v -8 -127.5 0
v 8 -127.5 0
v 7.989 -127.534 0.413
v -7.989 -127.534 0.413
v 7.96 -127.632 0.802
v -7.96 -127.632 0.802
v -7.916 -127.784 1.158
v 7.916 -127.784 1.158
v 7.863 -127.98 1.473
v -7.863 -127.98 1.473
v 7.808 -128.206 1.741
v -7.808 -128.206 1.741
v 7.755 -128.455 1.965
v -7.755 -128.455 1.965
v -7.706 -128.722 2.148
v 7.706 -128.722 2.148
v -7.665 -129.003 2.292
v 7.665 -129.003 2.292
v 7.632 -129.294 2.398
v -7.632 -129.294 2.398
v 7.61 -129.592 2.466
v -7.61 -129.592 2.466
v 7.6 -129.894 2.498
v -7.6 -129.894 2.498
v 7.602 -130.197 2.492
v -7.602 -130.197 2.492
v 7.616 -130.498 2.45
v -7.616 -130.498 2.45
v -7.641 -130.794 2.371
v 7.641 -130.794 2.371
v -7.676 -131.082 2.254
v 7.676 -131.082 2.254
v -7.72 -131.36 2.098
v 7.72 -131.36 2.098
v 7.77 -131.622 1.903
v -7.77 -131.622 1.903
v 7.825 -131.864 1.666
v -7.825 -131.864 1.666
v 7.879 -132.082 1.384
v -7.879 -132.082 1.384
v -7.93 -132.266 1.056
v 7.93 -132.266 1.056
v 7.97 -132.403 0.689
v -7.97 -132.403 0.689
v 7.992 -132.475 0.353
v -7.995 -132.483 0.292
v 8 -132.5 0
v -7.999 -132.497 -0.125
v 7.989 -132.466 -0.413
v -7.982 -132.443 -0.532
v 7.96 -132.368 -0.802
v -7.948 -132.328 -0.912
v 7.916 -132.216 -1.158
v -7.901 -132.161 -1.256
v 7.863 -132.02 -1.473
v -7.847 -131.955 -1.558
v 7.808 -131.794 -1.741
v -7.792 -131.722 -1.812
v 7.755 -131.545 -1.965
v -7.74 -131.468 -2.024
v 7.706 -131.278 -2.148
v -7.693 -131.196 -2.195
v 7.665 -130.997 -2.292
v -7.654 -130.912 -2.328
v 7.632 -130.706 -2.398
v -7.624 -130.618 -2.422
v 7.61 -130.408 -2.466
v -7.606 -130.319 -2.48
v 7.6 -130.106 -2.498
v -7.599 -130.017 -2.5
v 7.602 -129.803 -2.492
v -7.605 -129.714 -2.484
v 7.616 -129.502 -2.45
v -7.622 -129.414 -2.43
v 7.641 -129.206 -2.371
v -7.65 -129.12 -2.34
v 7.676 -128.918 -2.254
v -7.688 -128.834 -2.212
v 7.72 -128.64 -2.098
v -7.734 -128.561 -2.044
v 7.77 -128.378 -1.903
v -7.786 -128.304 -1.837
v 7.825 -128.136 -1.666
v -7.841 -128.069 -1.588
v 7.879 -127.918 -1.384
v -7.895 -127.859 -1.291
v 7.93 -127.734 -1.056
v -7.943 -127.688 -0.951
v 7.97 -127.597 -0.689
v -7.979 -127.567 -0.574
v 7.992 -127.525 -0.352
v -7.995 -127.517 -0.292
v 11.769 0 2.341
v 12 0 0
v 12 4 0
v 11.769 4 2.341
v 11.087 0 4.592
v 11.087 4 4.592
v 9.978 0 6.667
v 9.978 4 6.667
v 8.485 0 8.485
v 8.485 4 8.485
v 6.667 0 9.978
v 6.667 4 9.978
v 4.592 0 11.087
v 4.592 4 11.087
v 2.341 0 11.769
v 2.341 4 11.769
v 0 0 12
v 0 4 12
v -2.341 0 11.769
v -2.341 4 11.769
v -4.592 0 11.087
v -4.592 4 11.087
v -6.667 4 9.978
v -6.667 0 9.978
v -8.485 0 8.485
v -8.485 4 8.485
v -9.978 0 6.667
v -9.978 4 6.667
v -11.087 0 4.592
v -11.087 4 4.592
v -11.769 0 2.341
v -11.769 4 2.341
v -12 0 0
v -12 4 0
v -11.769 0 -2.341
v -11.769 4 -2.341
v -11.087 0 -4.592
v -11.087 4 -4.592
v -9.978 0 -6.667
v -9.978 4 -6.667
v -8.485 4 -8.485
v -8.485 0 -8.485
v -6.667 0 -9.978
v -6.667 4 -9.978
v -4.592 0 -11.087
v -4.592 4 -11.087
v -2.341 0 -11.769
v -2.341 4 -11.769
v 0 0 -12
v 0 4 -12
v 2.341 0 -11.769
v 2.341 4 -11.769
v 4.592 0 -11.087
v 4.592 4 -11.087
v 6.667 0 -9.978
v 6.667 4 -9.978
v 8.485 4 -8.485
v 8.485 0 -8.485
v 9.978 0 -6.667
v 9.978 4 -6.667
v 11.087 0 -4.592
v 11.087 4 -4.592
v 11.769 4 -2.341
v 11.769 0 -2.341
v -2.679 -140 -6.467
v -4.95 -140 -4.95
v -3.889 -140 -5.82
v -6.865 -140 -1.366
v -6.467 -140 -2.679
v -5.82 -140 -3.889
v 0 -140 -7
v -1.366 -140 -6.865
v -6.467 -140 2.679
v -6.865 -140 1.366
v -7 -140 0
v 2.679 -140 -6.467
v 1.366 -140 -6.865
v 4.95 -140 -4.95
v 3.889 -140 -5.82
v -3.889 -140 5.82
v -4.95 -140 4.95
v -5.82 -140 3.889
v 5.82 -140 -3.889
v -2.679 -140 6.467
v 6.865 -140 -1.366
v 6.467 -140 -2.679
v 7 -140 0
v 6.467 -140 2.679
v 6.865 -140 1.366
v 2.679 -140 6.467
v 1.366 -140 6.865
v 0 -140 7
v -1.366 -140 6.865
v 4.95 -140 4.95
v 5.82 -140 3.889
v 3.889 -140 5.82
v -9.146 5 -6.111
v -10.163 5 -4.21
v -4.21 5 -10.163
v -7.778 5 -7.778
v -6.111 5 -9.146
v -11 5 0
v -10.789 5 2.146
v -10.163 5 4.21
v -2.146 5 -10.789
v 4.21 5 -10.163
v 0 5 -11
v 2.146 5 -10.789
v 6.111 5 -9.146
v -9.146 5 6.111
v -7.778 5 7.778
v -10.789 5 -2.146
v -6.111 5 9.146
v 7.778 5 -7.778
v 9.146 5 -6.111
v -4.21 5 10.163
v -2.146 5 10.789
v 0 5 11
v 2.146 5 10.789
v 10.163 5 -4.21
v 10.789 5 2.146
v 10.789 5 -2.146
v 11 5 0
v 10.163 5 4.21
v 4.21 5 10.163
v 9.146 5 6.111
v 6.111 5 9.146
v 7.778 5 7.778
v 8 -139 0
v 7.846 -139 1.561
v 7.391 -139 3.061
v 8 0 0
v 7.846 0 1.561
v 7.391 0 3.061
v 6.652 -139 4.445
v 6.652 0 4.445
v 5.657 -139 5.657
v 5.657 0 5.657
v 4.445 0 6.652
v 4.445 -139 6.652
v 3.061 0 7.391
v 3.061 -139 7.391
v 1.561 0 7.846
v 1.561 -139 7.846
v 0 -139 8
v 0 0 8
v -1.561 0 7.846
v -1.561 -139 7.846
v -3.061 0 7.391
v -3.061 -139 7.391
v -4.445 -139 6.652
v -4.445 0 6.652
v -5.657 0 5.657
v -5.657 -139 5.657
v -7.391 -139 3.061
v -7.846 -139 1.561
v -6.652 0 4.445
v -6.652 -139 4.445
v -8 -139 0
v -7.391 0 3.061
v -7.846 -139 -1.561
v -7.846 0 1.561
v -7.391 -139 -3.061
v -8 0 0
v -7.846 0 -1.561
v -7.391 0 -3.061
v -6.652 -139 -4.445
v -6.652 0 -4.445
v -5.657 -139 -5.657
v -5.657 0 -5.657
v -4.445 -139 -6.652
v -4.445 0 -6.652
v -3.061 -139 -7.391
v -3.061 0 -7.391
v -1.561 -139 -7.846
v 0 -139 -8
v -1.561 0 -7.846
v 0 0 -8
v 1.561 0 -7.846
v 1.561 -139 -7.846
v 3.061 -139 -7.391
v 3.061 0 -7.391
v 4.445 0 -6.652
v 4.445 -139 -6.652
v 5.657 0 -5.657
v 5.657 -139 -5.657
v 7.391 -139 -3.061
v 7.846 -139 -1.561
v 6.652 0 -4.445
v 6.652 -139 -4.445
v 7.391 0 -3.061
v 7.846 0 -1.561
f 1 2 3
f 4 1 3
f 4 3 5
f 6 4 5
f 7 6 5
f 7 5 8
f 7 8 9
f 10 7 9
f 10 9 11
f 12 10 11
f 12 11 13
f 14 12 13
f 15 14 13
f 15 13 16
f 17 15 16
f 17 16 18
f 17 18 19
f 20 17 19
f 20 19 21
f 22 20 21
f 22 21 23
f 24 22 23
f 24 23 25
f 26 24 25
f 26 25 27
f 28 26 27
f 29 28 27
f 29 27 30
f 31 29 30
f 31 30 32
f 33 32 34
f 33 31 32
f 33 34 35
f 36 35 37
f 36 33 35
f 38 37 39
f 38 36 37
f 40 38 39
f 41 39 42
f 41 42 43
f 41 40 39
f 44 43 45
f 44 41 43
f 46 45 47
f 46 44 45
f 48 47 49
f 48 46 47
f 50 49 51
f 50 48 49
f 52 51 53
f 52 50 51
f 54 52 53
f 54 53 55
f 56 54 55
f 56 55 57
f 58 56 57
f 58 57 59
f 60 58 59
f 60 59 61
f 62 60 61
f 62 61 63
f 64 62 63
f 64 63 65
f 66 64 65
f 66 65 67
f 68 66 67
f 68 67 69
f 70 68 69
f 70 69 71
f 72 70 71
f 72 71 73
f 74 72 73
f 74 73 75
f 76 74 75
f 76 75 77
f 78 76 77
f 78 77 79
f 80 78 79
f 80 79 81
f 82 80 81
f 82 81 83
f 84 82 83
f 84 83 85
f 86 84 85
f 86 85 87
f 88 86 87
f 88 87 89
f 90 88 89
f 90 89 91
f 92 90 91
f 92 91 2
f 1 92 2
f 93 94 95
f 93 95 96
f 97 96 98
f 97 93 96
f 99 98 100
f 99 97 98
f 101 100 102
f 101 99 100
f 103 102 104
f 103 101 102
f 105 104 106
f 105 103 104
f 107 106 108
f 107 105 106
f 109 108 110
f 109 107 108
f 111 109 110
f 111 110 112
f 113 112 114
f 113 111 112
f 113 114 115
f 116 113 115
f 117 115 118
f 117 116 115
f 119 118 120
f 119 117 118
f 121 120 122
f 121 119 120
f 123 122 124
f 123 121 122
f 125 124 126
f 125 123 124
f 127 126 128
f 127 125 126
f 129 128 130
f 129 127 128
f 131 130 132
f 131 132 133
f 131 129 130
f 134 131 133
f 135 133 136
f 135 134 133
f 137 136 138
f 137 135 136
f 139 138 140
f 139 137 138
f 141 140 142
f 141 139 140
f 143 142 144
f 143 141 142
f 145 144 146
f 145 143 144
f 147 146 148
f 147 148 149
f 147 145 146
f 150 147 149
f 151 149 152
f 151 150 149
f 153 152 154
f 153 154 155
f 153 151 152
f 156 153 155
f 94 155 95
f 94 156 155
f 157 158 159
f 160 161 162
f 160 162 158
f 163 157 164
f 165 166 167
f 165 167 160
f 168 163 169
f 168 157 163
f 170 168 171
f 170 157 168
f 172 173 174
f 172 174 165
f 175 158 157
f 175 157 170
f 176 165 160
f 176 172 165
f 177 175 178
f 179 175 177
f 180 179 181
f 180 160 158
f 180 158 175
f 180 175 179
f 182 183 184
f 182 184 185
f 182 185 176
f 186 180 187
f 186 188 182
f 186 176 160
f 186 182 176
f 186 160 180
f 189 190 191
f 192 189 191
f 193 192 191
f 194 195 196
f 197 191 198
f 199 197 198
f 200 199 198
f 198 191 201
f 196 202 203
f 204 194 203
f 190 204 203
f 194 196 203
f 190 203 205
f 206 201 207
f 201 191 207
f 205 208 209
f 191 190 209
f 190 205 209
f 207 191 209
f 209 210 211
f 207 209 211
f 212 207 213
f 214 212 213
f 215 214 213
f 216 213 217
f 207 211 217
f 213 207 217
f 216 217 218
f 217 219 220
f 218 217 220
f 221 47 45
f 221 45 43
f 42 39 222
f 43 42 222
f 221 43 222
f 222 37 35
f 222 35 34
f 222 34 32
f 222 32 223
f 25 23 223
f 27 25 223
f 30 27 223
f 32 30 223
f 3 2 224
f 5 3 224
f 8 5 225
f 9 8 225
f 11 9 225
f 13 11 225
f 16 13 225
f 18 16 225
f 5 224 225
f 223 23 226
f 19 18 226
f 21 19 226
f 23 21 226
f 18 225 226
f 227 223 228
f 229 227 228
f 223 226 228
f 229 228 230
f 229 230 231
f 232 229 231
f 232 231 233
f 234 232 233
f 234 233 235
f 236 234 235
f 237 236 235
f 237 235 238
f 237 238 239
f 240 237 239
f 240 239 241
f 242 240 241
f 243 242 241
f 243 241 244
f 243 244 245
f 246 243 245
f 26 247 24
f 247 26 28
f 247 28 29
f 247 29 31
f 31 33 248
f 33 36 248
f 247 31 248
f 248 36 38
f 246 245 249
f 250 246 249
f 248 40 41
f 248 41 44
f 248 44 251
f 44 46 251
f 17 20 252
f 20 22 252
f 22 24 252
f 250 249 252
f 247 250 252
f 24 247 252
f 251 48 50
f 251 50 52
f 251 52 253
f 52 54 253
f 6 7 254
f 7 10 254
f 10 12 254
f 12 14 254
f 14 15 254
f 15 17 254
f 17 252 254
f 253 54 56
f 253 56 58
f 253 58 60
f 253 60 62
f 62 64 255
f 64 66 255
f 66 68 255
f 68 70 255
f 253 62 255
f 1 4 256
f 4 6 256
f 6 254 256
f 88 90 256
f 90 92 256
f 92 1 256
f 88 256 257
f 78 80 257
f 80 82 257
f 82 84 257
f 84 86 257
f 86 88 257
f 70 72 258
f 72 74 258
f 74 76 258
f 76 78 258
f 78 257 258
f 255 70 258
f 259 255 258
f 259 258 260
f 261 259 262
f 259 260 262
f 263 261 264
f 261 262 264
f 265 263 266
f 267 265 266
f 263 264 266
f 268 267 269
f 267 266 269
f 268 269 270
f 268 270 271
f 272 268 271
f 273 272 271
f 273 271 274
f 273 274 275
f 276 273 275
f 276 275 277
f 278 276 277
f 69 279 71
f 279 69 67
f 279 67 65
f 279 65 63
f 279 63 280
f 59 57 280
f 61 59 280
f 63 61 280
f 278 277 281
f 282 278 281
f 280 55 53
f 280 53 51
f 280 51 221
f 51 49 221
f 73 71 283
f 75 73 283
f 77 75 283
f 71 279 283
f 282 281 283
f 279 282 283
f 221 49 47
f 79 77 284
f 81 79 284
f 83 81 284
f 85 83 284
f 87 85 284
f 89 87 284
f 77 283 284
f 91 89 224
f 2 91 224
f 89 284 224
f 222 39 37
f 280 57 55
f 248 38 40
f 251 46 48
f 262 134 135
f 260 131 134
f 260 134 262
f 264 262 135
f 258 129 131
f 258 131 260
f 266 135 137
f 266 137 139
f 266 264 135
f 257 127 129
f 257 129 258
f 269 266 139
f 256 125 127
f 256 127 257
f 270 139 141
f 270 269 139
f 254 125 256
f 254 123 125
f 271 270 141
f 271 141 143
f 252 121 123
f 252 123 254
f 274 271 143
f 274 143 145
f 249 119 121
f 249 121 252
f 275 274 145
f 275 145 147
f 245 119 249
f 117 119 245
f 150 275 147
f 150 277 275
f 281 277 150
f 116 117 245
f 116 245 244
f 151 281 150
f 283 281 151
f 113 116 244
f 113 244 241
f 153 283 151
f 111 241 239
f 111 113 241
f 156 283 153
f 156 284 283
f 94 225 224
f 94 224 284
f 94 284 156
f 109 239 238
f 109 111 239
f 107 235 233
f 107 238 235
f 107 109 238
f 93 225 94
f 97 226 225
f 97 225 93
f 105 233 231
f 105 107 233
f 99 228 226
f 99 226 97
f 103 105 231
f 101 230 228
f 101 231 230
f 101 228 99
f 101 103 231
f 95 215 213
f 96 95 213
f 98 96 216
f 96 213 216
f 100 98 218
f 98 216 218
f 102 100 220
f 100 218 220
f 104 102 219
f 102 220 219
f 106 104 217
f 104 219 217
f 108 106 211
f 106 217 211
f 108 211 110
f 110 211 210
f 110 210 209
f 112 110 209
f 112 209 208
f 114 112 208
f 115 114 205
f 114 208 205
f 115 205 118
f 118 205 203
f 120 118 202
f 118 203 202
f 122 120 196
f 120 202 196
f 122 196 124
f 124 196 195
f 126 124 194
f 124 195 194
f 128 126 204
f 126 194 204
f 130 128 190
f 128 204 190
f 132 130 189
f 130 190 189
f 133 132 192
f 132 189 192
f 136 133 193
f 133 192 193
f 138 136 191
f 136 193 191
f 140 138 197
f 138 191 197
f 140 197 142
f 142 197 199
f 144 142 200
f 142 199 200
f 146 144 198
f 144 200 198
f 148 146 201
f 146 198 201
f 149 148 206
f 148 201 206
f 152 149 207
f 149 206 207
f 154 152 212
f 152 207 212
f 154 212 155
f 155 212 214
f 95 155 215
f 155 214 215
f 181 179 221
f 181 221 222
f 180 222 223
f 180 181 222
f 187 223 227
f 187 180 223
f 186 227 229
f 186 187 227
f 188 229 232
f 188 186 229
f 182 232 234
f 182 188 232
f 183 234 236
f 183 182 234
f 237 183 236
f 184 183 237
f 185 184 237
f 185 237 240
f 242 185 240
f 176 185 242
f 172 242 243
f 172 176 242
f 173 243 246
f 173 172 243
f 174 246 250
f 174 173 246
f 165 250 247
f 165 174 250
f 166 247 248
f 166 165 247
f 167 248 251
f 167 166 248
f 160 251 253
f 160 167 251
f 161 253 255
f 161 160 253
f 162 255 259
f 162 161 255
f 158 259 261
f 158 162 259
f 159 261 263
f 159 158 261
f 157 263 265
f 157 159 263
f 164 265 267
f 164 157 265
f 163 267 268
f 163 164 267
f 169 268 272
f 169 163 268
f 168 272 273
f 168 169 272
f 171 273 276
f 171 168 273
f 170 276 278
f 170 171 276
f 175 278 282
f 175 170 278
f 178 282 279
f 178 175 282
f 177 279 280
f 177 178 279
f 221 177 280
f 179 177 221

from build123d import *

# Parameters (mm, degrees)
F0_R     = 8
F1_DEPTH = 140
F0_R_2   = 12
F2_DEPTH = 5
F3_SIZE  = 1
F5_R     = 2.5
F6_DEPTH = 20.001


with BuildPart() as f1:
    # F0 (on Front) → F1 (new body)
    with BuildSketch(Plane.XZ):
        Circle(F0_R)
    extrude(amount=F1_DEPTH)

    # F0 (on Front) → F2 (join)
    with BuildSketch(Plane.XZ):
        Circle(F0_R_2)
        Circle(F0_R, mode=Mode.SUBTRACT)
        Circle(F0_R)
    extrude(amount=-F2_DEPTH)

    # F3
    f3_edges = [f1.edges().sort_by_distance(p)[0] for p in [
        (-12, 5, 0),
        (-8, -140, 0),
    ]]
    chamfer(f3_edges, length=F3_SIZE)

    # F5 (on offset) → F6 (cut, through all)
    with BuildSketch(Plane.YZ.offset(-8)):
        with Locations((-130, 0)):
            Circle(F5_R)
    extrude(amount=F6_DEPTH, mode=Mode.SUBTRACT)


solid = f1.part
